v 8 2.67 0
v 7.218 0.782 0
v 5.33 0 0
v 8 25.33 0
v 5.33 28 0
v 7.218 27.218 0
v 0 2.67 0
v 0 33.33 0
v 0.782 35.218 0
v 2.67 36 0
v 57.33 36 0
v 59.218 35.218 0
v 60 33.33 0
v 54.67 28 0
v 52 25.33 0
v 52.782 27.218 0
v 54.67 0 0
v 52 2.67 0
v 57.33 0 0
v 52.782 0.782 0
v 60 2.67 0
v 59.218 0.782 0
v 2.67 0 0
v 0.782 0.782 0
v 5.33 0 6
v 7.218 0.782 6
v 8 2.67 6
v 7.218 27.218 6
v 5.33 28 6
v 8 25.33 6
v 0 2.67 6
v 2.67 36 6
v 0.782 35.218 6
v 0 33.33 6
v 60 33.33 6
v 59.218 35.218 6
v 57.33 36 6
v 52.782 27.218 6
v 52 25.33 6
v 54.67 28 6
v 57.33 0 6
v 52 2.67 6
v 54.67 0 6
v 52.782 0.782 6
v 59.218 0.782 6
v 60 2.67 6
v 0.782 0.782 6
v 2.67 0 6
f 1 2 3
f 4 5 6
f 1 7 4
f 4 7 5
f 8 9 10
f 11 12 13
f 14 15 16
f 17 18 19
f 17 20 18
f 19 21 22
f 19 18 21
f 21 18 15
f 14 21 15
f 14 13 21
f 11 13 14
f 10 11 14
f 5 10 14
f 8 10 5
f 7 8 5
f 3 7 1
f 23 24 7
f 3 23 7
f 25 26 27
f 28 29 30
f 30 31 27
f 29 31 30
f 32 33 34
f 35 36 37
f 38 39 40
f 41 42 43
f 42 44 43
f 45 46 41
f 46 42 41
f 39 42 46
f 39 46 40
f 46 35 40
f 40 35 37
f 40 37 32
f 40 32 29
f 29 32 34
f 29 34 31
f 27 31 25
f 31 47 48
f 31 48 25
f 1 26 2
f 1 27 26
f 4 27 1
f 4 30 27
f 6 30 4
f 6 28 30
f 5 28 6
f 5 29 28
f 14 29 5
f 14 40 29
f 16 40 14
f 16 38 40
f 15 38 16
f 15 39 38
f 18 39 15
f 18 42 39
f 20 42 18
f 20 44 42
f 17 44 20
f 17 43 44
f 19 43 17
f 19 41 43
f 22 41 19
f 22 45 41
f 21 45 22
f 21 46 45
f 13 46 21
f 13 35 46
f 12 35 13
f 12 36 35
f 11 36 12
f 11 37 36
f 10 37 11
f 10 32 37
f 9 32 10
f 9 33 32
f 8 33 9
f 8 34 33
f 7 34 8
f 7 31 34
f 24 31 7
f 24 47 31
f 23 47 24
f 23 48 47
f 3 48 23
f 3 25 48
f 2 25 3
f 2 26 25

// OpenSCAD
$fn = 32;

// ----------------------------------------------------------------------
// Clip blank: staple clip, 6 mm thick
// ----------------------------------------------------------------------

// --- parameters (mm) ---
profile_height = 6;       // extrusion height
profile_points = 24;      // points of the closed outline

profile = [[0, 2.67], [0.782, 0.782], [2.67, 0], [5.33, 0], [7.218, 0.782], [8, 2.67], [8, 25.33], [7.218, 27.218], [5.33, 28], [54.67, 28], [52.782, 27.218], [52, 25.33], [52, 2.67], [52.782, 0.782], [54.67, 0], [57.33, 0], [59.218, 0.782], [60, 2.67], [60, 33.33], [59.218, 35.218], [57.33, 36], [2.67, 36], [0.782, 35.218], [0, 33.33]];  // single closed polygon, 24 points, counter clockwise

// --- the one profile operation ---
linear_extrude(height = profile_height) polygon(points = profile);
